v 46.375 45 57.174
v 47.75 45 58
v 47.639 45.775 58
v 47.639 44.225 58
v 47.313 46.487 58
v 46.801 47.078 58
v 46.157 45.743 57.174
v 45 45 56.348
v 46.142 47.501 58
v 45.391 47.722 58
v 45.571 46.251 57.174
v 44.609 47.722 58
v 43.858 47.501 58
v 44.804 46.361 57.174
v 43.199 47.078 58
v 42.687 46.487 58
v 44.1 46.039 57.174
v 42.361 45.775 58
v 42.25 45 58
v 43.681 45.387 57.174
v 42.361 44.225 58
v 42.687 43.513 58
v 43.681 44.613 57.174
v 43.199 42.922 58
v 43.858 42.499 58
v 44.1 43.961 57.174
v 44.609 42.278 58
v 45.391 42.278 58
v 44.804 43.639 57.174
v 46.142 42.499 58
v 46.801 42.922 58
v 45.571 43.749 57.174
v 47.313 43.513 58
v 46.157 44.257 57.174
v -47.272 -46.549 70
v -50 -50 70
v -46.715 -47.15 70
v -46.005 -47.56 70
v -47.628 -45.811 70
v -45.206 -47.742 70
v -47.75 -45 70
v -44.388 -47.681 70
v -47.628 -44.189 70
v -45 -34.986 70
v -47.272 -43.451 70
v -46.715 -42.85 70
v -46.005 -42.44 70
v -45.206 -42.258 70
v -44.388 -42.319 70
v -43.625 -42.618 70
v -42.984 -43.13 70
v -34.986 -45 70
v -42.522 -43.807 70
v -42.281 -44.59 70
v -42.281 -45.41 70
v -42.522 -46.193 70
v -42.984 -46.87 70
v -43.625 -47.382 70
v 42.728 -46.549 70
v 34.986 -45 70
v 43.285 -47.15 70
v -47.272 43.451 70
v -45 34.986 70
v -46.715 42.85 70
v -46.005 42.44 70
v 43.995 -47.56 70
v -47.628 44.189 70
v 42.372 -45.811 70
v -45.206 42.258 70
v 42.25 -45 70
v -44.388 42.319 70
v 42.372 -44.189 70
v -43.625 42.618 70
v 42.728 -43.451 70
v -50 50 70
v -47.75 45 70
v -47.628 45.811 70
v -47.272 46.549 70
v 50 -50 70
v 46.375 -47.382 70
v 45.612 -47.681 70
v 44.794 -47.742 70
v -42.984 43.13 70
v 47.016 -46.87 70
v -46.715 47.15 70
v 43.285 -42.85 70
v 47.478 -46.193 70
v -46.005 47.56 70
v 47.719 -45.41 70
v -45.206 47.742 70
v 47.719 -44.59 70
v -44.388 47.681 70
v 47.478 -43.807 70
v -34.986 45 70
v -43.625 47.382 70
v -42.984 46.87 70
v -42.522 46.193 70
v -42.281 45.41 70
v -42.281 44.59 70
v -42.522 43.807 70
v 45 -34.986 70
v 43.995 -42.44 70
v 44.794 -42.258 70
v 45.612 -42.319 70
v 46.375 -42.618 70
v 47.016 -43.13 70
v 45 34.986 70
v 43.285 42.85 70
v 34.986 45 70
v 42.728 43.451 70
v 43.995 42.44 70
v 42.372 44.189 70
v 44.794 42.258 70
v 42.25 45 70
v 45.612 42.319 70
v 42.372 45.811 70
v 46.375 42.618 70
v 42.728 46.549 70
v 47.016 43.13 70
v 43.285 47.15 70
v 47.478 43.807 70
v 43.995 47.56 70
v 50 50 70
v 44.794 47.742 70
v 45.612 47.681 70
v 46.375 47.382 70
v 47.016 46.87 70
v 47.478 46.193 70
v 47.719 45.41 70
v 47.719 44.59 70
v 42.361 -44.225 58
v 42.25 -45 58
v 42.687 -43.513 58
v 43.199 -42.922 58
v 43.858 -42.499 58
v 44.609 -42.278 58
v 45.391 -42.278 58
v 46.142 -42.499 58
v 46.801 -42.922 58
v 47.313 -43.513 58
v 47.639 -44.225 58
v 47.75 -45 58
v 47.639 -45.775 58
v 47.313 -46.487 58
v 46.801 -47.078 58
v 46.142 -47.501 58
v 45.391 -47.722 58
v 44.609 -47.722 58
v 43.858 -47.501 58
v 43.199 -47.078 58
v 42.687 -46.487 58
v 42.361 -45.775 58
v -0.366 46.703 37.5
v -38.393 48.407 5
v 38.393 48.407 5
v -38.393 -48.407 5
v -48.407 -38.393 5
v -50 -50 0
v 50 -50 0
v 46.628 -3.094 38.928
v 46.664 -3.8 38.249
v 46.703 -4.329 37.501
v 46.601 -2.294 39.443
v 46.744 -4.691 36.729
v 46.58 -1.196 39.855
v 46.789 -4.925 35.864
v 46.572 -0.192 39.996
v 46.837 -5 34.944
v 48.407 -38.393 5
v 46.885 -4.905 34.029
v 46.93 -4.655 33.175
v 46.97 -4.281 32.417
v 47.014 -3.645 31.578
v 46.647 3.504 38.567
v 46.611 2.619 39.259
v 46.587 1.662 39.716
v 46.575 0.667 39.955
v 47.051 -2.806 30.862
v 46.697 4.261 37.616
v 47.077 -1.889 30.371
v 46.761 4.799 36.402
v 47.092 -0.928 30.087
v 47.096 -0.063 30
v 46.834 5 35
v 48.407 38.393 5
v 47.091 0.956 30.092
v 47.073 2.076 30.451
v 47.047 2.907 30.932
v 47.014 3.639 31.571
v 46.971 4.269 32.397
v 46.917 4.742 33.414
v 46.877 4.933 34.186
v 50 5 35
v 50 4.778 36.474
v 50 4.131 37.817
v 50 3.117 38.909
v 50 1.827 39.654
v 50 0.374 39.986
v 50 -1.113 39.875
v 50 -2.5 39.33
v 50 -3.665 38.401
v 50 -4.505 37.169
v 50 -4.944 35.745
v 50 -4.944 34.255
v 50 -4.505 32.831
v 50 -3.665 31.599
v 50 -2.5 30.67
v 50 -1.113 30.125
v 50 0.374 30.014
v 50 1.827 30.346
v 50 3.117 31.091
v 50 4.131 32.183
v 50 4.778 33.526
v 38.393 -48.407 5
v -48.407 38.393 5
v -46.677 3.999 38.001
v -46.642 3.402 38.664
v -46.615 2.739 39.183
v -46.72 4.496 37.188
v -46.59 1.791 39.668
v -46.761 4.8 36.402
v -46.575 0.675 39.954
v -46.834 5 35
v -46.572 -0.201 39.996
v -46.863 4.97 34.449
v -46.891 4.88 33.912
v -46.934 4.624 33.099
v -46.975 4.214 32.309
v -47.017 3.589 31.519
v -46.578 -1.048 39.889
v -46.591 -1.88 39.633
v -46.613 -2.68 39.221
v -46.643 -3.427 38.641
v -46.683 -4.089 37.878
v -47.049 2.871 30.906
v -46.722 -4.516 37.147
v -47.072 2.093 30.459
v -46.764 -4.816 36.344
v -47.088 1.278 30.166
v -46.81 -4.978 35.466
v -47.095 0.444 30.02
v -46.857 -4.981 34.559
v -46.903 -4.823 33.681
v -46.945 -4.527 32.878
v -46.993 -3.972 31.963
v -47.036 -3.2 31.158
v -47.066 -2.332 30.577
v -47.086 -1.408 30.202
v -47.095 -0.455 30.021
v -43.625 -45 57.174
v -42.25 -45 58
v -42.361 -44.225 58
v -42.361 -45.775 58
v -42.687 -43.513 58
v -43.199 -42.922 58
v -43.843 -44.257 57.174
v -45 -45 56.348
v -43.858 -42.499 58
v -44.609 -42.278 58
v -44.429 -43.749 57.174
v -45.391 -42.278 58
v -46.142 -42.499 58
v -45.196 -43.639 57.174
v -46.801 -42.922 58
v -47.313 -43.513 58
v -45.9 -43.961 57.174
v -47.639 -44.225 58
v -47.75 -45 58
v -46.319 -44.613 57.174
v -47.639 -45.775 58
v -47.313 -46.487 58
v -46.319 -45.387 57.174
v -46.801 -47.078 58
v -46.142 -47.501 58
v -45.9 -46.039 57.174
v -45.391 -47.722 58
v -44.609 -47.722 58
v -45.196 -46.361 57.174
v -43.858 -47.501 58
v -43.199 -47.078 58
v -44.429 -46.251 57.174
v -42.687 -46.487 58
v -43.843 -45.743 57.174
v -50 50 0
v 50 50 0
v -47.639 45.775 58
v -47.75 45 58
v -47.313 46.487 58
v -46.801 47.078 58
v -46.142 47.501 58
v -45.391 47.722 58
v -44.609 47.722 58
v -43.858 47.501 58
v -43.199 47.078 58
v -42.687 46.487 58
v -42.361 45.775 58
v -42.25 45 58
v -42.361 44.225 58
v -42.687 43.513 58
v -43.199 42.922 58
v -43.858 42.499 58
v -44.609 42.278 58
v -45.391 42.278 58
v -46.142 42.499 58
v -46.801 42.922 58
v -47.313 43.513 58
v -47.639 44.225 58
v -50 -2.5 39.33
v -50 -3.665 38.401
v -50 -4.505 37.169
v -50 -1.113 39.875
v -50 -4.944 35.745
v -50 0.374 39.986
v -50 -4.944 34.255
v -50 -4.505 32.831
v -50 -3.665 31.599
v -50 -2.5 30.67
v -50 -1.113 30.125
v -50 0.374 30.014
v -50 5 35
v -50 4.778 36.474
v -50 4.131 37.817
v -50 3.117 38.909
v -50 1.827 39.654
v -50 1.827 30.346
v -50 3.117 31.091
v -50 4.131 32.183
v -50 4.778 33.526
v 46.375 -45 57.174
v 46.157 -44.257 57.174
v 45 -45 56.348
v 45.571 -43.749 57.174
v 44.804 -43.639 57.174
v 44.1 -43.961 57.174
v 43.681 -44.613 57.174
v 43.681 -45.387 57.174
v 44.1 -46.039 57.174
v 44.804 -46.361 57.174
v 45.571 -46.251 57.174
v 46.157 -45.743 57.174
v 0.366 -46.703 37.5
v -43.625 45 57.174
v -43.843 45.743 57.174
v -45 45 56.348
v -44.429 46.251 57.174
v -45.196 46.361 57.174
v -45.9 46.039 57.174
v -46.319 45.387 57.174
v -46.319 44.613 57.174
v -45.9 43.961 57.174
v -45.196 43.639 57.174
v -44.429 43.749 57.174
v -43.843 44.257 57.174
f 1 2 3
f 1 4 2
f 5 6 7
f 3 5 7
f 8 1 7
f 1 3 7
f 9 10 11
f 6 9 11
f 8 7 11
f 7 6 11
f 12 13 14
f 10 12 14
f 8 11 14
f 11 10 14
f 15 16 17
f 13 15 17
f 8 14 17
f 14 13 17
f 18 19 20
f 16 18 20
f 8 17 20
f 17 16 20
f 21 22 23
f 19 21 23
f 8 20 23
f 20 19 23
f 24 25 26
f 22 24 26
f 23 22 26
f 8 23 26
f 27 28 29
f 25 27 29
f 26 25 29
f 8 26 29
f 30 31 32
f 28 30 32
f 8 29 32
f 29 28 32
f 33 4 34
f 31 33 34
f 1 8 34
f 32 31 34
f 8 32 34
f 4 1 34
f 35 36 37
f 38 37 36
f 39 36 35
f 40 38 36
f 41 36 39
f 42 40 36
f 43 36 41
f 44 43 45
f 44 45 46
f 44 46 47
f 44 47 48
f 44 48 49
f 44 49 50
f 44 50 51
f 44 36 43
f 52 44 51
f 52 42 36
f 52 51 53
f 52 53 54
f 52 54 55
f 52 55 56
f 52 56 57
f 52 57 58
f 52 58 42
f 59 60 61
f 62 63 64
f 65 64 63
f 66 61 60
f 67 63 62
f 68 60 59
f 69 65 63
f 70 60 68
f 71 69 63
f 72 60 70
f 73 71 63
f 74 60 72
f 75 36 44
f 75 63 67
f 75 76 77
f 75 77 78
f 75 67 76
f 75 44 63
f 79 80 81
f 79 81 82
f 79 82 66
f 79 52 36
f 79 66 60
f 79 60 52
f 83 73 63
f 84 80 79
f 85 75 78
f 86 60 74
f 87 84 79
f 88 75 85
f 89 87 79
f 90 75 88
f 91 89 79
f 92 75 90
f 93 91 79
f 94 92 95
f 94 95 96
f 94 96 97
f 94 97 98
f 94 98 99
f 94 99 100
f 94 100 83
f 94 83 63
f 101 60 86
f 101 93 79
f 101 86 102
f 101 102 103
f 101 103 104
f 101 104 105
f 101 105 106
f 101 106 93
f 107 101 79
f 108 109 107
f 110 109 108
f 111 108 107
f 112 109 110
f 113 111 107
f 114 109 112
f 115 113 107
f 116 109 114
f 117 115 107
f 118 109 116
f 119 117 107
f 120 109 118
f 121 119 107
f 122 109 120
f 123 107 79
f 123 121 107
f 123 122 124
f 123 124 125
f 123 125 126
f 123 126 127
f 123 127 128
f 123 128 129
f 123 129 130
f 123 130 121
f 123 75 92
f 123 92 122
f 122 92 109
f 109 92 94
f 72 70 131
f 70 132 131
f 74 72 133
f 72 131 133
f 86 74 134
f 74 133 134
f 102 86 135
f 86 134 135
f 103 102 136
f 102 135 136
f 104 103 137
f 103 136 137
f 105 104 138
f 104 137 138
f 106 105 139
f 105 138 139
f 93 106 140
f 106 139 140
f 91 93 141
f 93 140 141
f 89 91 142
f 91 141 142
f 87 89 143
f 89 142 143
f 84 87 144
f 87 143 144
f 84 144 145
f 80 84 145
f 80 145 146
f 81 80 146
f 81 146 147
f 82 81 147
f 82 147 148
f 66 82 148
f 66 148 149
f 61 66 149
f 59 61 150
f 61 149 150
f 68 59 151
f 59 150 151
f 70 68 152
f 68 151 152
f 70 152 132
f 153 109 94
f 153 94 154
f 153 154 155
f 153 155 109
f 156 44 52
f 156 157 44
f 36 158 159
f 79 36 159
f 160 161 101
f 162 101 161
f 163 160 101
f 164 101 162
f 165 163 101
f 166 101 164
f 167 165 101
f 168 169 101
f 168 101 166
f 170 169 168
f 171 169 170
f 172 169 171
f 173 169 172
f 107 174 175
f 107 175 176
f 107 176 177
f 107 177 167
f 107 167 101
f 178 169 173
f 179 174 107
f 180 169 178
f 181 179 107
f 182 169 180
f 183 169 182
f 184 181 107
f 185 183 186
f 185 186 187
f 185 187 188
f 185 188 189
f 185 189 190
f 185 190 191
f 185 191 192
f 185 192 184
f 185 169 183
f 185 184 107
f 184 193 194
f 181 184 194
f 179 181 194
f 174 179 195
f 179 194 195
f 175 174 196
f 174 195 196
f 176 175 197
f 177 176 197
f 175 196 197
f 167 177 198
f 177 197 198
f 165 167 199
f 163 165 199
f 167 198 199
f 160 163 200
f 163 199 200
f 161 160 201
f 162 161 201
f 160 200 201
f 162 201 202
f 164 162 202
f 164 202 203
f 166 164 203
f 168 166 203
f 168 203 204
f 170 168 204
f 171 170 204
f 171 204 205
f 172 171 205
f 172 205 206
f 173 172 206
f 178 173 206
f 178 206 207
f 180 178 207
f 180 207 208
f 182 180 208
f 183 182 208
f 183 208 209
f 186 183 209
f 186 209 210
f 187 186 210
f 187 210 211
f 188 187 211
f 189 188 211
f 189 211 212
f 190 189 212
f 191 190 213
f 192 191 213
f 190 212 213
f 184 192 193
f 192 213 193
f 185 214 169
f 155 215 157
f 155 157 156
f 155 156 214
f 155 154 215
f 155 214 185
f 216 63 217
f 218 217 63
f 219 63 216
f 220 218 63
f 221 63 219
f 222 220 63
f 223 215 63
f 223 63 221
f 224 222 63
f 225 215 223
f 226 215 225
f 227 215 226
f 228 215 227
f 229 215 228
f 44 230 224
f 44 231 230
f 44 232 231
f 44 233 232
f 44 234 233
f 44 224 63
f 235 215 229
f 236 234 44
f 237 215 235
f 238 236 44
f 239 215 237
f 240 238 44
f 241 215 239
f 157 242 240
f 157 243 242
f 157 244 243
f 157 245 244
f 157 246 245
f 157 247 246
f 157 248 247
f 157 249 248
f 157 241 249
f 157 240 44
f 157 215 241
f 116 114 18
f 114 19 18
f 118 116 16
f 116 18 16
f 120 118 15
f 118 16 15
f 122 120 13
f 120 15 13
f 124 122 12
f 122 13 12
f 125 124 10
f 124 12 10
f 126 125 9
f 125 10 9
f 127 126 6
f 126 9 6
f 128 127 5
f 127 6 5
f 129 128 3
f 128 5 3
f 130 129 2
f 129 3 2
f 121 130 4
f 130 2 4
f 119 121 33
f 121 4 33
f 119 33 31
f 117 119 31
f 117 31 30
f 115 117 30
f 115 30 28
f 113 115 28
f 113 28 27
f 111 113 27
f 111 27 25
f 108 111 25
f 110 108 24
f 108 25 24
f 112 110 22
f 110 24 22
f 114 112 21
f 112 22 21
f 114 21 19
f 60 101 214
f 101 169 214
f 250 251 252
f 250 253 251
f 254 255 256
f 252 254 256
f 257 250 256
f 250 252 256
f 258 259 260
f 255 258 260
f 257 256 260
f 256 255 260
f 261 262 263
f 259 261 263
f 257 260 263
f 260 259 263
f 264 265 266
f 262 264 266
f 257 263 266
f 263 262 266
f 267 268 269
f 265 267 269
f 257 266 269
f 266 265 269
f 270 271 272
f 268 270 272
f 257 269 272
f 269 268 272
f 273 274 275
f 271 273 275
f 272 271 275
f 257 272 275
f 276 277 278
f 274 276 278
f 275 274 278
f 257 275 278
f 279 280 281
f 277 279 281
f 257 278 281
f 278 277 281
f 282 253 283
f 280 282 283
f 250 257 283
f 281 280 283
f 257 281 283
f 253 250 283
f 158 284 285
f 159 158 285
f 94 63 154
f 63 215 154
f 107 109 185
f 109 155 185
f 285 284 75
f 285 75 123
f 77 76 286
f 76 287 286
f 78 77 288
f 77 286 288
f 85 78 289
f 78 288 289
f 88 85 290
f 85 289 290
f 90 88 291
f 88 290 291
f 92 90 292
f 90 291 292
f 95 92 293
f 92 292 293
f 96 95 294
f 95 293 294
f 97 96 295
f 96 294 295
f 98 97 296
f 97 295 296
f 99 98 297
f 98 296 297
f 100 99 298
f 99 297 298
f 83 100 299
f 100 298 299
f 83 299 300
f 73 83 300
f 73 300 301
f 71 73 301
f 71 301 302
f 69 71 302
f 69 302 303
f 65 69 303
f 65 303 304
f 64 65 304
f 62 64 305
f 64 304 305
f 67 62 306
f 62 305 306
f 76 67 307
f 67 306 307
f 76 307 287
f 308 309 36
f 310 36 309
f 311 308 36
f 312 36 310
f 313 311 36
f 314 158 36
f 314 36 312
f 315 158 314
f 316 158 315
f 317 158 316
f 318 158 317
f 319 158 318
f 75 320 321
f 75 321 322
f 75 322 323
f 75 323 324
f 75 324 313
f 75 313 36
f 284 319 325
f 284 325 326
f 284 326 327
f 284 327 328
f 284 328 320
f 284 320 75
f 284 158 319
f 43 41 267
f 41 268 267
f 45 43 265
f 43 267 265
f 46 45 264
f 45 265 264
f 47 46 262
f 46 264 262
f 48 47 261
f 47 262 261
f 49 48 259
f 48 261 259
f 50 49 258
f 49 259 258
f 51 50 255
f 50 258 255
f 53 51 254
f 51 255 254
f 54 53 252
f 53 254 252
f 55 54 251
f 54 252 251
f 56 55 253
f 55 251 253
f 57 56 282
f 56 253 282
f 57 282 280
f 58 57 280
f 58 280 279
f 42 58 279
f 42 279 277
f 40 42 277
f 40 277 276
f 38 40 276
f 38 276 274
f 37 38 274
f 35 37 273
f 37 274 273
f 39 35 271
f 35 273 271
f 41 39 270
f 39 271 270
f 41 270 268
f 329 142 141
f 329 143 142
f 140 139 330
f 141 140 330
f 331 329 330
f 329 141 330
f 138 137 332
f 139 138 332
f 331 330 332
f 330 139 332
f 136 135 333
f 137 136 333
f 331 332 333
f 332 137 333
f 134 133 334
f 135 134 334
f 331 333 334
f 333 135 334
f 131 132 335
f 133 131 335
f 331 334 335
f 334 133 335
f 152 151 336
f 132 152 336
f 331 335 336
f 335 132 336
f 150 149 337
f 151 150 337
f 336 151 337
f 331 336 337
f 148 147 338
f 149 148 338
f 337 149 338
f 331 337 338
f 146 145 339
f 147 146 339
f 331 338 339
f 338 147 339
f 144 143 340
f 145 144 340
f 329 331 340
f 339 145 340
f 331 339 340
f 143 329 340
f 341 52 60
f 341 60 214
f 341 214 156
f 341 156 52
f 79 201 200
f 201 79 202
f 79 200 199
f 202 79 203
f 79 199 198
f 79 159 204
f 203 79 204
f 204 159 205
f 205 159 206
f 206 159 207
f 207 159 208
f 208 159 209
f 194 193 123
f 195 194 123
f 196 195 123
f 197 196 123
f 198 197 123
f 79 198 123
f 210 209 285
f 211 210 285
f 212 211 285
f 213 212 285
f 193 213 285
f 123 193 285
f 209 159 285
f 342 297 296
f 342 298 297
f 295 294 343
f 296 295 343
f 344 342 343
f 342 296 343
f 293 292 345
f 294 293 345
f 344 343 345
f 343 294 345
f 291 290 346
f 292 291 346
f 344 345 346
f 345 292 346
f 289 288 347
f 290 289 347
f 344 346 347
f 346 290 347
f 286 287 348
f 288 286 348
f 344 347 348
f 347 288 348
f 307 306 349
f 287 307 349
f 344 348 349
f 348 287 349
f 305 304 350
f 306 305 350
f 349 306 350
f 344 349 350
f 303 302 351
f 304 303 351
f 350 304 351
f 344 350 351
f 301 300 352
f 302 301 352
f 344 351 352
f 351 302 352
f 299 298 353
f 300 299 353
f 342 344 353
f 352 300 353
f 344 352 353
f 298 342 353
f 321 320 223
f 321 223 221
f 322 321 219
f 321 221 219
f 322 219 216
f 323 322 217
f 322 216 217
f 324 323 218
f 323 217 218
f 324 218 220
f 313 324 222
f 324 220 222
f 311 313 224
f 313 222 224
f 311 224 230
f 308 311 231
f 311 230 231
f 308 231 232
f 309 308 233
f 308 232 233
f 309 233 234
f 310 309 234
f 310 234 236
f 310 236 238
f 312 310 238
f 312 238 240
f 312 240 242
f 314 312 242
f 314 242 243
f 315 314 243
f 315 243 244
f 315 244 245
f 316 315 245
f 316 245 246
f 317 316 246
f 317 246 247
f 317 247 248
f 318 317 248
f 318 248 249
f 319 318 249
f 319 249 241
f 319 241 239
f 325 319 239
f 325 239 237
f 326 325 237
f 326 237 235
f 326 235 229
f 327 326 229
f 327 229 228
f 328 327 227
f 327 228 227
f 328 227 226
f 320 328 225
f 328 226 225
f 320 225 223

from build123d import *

# Parameters (mm, degrees)
F0_W       = 100
F0_H       = 100
F1_DEPTH   = 70
F2_W       = 90
F2_H       = 90
F3_DEPTH   = 65
F3_TAPER   = -3
F4_R       = 5
F1_FACE2_W = 100
F1_FACE2_H = 70
F5_DEPTH   = 100.001
F6_SIZE    = 10
F7_D       = 5.5
F7_DEPTH   = 12
F7_TIP     = 1.6523667023


with BuildPart() as f1:
    # F0 (on Top) → F1 (new body)
    with BuildSketch(Plane.XY):
        Rectangle(F0_W, F0_H)
    extrude(amount=F1_DEPTH)

    # F2 (on face) → F3 (cut)
    with BuildSketch(Plane.XY.offset(70)):
        Rectangle(F2_W, F2_H)
    extrude(amount=-F3_DEPTH, taper=F3_TAPER, mode=Mode.SUBTRACT)

    # F4 (on face) + F1_face2 (on face) → F5 (cut, through all)
    with BuildSketch(Plane.YZ.offset(50)):
        with Locations((0, 35)):
            Circle(F4_R)
    with BuildSketch(Plane(origin=(-50, 0, 35), x_dir=(0, -1, 0), z_dir=(-1, 0, 0))):
        Rectangle(F1_FACE2_W, F1_FACE2_H)
    extrude(amount=-F5_DEPTH, dir=(1, 0, 0), mode=Mode.SUBTRACT)

    # F6
    f6_edges = [f1.edges().sort_by_distance(p)[0] for p in [
        (46.703253, 46.703253, 37.5),
        (-46.703253, 46.703253, 37.5),
        (-46.703253, -46.703253, 37.5),
        (46.703253, -46.703253, 37.5),
    ]]
    chamfer(f6_edges, length=F6_SIZE)

    # F7
    with Locations(Plane.XY.offset(70)):
        with Locations((-45, -45), (-45, 45), (45, 45), (45, -45)):
            Hole(F7_D / 2, depth=F7_DEPTH)
            with Locations((0, 0, -(F7_DEPTH + F7_TIP / 2))):  # 118° drill point
                Cone(0, F7_D / 2, F7_TIP, mode=Mode.SUBTRACT)


solid = f1.part
